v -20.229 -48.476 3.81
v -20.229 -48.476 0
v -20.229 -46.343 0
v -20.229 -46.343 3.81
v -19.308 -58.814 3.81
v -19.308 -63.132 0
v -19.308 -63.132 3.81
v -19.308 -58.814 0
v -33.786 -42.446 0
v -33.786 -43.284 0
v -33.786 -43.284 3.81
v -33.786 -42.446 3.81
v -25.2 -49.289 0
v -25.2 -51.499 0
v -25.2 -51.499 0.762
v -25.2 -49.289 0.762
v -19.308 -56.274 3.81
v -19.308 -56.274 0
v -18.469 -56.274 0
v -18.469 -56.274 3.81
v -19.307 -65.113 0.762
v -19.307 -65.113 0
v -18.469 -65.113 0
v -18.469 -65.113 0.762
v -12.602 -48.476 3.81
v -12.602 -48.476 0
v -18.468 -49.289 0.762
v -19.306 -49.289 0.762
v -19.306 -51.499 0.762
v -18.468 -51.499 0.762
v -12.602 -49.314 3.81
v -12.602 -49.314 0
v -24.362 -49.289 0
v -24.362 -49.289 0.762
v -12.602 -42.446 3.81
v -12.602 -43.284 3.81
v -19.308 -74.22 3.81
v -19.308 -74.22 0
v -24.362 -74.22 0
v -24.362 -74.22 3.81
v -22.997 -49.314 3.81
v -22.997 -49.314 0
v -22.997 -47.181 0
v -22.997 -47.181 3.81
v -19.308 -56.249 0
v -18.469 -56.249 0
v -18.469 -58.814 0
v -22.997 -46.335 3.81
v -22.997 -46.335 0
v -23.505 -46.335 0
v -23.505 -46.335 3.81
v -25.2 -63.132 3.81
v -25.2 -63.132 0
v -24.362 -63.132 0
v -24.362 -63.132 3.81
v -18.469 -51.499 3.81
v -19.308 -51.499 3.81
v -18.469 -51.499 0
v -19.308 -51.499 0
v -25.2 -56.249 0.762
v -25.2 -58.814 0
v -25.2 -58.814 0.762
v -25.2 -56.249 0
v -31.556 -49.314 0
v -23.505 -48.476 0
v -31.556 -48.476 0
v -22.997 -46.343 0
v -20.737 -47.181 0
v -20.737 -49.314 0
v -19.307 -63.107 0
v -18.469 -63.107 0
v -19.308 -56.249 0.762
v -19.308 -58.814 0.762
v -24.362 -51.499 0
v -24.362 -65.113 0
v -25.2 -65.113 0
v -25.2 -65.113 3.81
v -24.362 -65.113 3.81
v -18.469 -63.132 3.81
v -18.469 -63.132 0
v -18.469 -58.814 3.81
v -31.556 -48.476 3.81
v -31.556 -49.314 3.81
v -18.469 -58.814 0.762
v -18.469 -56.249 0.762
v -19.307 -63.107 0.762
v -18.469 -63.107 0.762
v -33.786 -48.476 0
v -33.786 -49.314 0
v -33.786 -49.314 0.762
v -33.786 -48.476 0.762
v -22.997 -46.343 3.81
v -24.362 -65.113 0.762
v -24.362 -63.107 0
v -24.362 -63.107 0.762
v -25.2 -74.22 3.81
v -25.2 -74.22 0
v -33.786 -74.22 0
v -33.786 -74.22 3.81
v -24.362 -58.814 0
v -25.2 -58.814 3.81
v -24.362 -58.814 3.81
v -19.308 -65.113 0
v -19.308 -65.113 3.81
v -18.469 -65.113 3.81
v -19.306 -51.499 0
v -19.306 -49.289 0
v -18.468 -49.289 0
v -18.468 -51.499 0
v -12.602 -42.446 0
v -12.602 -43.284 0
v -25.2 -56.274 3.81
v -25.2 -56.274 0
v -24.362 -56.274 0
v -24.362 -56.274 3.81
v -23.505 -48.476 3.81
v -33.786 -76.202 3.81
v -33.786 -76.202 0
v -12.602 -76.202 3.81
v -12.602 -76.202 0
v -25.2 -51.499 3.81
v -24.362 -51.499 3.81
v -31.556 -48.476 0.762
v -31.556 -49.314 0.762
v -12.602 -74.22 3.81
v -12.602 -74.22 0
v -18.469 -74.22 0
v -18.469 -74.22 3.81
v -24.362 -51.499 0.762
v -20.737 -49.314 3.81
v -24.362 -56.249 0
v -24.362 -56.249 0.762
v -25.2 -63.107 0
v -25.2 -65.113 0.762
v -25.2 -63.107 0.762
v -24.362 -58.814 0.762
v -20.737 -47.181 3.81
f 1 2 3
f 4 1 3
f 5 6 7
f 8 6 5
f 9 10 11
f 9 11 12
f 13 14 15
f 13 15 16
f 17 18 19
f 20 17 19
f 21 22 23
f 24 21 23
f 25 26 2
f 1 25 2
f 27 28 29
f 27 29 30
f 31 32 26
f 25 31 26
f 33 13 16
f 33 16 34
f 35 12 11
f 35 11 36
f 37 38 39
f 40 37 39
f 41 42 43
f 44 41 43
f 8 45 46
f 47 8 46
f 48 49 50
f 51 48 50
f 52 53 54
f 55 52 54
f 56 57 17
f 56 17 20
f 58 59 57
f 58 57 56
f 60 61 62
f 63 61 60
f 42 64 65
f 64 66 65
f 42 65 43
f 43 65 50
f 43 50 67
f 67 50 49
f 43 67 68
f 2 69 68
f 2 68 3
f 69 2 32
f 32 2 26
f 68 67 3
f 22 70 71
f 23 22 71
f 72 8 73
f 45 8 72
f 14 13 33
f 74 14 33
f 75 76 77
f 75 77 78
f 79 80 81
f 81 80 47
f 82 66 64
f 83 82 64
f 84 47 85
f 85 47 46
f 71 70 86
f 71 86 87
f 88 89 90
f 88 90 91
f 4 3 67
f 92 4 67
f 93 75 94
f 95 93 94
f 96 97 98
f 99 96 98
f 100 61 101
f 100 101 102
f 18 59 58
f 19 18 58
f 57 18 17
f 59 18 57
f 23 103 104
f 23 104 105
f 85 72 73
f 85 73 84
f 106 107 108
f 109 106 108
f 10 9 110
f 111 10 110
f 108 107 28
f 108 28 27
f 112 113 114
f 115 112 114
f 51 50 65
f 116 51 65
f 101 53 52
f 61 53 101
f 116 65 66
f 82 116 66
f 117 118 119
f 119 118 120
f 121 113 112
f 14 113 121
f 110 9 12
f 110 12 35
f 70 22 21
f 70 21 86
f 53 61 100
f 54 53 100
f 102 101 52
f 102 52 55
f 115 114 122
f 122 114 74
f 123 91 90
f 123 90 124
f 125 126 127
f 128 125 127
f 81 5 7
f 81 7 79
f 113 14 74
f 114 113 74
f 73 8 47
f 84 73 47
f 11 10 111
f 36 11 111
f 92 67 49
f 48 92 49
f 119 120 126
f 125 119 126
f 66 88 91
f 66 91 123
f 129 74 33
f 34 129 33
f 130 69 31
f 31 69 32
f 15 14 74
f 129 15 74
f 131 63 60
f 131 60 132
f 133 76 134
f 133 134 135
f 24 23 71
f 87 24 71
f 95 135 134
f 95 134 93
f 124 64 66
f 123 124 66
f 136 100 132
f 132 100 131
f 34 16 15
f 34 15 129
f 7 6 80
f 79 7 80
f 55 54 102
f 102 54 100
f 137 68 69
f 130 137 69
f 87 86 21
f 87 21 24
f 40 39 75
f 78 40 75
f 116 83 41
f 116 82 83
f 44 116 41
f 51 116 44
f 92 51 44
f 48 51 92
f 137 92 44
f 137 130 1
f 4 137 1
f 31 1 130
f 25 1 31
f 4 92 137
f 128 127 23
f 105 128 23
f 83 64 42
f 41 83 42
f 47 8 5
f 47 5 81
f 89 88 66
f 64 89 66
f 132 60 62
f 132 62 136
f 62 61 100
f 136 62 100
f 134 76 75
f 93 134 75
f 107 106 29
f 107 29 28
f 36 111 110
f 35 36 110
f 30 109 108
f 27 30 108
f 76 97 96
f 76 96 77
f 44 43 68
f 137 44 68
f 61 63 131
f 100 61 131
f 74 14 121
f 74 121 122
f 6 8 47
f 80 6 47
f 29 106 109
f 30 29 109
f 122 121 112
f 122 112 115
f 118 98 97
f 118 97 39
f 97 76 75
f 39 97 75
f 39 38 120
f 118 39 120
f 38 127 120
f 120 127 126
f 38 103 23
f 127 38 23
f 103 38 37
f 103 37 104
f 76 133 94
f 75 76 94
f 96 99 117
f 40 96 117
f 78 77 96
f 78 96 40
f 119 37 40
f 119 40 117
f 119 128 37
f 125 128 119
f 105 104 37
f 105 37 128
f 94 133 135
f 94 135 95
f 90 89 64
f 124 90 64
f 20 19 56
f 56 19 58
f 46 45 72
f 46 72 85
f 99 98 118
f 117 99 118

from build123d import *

# Parameters (mm, degrees)
F0_W     = 0.8382
F0_H     = 1.9417995741
F0_H_2   = 9.1072004259
F0_H_3   = 1.9417967643
F0_H_4   = 9.1072032357
F1_DEPTH = 3.81
F0_H_5   = 4.318
F0_H_6   = 4.7752
F0_W_2   = 2.2600471539
F0_H_7   = 0.8382
F0_W_3   = 21.1832629488
F2_W     = 2.2298406
F2_H     = 0.8382
F3_DEPTH = 0.762
F2_W_2   = 0.8382
F2_H_2   = 2.2098
F2_H_3   = 2.5654
F2_H_4   = 2.0066


with BuildPart() as f1:
    # F0 (on Top) → F1 (new body)
    with BuildSketch(Plane.XY):
        with Locations((-24.7812528231, -75.1912873556)):
            Rectangle(F0_W, F0_H)
        Polygon((-24.3621528231, -76.1621871427), (-25.2003528231, -76.1621871427), (-25.2003528231, -74.2203875685), (-33.7855493596, -74.2203875685), (-33.7855493596, -76.2015875685), (-12.6018980518, -76.2015875685), (-12.6018980518, -74.2203875685), (-18.4693528231, -74.2203875685), (-18.4693528231, -76.1621843328), (-19.3075528231, -76.1621843328), (-19.3075528231, -74.2203875685), (-24.3621528231, -74.2203875685), align=None)
        with Locations((-24.7812528231, -69.6667873556)):
            Rectangle(F0_W, F0_H_2)
        with Locations((-18.8884528231, -75.1912859507)):
            Rectangle(F0_W, F0_H_3)
        with Locations((-18.8884528231, -69.6667859507)):
            Rectangle(F0_W, F0_H_4)
    extrude(amount=F1_DEPTH)


with BuildPart() as f1b:
    # F0 (on Top) → F1, piece 2 (new body)
    with BuildSketch(Plane.XY):
        with Locations((-24.7812528231, -60.9729871427)):
            Rectangle(F0_W, F0_H_5)
    extrude(amount=F1_DEPTH)


with BuildPart() as f1c:
    # F0 (on Top) → F1, piece 3 (new body)
    with BuildSketch(Plane.XY):
        with Locations((-18.8884528231, -60.9729843328)):
            Rectangle(F0_W, F0_H_5)
    extrude(amount=F1_DEPTH)


with BuildPart() as f1d:
    # F0 (on Top) → F1, piece 4 (new body)
    with BuildSketch(Plane.XY):
        with Locations((-24.7812493596, -53.8863871427)):
            Rectangle(F0_W, F0_H_6)
    extrude(amount=F1_DEPTH)


with BuildPart() as f1e:
    # F0 (on Top) → F1, piece 5 (new body)
    with BuildSketch(Plane.XY):
        with Locations((-18.8884493596, -53.8863843328)):
            Rectangle(F0_W, F0_H_6)
    extrude(amount=F1_DEPTH)


with BuildPart() as f1f:
    # F0 (on Top) → F1, piece 6 (new body)
    with BuildSketch(Plane.XY):
        Polygon((-31.5557122231, -49.3143871427), (-22.9968010945, -49.3143871427), (-22.9968010945, -48.4761871427), (-23.5048010945, -48.4761871427), (-31.5557122231, -48.4761871427), align=None)
        Polygon((-23.5048010945, -48.4761871427), (-22.9968010945, -48.4761871427), (-22.9968010945, -47.1809990704), (-22.9968010945, -46.3427990704), (-22.9968010945, -46.3349238067), (-23.5048010945, -46.3349238067), align=None)
        with Locations((-21.8667775176, -46.7618990704)):
            Rectangle(F0_W_2, F0_H_7)
        Polygon((-20.7367539406, -46.3427990704), (-20.7367539406, -47.1809990704), (-20.7367539406, -48.4761843328), (-20.2287539406, -48.4761843328), (-20.2287539406, -46.3427990704), align=None)
        Polygon((-20.2287539406, -48.4761843328), (-20.7367539406, -48.4761843328), (-20.7367539406, -49.3143843328), (-12.6017937437, -49.3143843328), (-12.6017937437, -48.4761843328), align=None)
    extrude(amount=F1_DEPTH)


with BuildPart() as f1g:
    # F0 (on Top) → F1, piece 7 (new body)
    with BuildSketch(Plane.XY):
        with Locations((-23.1939016856, -42.8647909328)):
            Rectangle(F0_W_3, F0_H_7)
    extrude(amount=F1_DEPTH)


with BuildPart() as f3:
    # F2 (on Top) → F3 (new body)
    with BuildSketch(Plane.XY):
        with Locations((-32.6705976321, -48.8953012973)):
            Rectangle(F2_W, F2_H)
    extrude(amount=F3_DEPTH)


with BuildPart() as f3b:
    # F2 (on Top) → F3, piece 2 (new body)
    with BuildSketch(Plane.XY):
        with Locations((-24.7812520727, -50.393885615)):
            Rectangle(F2_W_2, F2_H_2)
    extrude(amount=F3_DEPTH)


with BuildPart() as f3c:
    # F2 (on Top) → F3, piece 3 (new body)
    with BuildSketch(Plane.XY):
        with Locations((-18.8873026535, -50.3936360205)):
            Rectangle(F2_W_2, F2_H_2)
    extrude(amount=F3_DEPTH)


with BuildPart() as f3d:
    # F2 (on Top) → F3, piece 4 (new body)
    with BuildSketch(Plane.XY):
        with Locations((-24.7808683678, -57.531244459)):
            Rectangle(F2_W_2, F2_H_3)
    extrude(amount=F3_DEPTH)


with BuildPart() as f3e:
    # F2 (on Top) → F3, piece 5 (new body)
    with BuildSketch(Plane.XY):
        with Locations((-24.7811310008, -64.1099464409)):
            Rectangle(F2_W_2, F2_H_4)
    extrude(amount=F3_DEPTH)


with BuildPart() as f3f:
    # F2 (on Top) → F3, piece 6 (new body)
    with BuildSketch(Plane.XY):
        with Locations((-18.8885375872, -57.5315424822)):
            Rectangle(F2_W_2, F2_H_3)
    extrude(amount=F3_DEPTH)


with BuildPart() as f3g:
    # F2 (on Top) → F3, piece 7 (new body)
    with BuildSketch(Plane.XY):
        with Locations((-18.8882321134, -64.1101997606)):
            Rectangle(F2_W_2, F2_H_4)
    extrude(amount=F3_DEPTH)


solid = Compound([f1.part, f1b.part, f1c.part, f1d.part, f1e.part, f1f.part, f1g.part, f3.part, f3b.part, f3c.part, f3d.part, f3e.part, f3f.part, f3g.part])
